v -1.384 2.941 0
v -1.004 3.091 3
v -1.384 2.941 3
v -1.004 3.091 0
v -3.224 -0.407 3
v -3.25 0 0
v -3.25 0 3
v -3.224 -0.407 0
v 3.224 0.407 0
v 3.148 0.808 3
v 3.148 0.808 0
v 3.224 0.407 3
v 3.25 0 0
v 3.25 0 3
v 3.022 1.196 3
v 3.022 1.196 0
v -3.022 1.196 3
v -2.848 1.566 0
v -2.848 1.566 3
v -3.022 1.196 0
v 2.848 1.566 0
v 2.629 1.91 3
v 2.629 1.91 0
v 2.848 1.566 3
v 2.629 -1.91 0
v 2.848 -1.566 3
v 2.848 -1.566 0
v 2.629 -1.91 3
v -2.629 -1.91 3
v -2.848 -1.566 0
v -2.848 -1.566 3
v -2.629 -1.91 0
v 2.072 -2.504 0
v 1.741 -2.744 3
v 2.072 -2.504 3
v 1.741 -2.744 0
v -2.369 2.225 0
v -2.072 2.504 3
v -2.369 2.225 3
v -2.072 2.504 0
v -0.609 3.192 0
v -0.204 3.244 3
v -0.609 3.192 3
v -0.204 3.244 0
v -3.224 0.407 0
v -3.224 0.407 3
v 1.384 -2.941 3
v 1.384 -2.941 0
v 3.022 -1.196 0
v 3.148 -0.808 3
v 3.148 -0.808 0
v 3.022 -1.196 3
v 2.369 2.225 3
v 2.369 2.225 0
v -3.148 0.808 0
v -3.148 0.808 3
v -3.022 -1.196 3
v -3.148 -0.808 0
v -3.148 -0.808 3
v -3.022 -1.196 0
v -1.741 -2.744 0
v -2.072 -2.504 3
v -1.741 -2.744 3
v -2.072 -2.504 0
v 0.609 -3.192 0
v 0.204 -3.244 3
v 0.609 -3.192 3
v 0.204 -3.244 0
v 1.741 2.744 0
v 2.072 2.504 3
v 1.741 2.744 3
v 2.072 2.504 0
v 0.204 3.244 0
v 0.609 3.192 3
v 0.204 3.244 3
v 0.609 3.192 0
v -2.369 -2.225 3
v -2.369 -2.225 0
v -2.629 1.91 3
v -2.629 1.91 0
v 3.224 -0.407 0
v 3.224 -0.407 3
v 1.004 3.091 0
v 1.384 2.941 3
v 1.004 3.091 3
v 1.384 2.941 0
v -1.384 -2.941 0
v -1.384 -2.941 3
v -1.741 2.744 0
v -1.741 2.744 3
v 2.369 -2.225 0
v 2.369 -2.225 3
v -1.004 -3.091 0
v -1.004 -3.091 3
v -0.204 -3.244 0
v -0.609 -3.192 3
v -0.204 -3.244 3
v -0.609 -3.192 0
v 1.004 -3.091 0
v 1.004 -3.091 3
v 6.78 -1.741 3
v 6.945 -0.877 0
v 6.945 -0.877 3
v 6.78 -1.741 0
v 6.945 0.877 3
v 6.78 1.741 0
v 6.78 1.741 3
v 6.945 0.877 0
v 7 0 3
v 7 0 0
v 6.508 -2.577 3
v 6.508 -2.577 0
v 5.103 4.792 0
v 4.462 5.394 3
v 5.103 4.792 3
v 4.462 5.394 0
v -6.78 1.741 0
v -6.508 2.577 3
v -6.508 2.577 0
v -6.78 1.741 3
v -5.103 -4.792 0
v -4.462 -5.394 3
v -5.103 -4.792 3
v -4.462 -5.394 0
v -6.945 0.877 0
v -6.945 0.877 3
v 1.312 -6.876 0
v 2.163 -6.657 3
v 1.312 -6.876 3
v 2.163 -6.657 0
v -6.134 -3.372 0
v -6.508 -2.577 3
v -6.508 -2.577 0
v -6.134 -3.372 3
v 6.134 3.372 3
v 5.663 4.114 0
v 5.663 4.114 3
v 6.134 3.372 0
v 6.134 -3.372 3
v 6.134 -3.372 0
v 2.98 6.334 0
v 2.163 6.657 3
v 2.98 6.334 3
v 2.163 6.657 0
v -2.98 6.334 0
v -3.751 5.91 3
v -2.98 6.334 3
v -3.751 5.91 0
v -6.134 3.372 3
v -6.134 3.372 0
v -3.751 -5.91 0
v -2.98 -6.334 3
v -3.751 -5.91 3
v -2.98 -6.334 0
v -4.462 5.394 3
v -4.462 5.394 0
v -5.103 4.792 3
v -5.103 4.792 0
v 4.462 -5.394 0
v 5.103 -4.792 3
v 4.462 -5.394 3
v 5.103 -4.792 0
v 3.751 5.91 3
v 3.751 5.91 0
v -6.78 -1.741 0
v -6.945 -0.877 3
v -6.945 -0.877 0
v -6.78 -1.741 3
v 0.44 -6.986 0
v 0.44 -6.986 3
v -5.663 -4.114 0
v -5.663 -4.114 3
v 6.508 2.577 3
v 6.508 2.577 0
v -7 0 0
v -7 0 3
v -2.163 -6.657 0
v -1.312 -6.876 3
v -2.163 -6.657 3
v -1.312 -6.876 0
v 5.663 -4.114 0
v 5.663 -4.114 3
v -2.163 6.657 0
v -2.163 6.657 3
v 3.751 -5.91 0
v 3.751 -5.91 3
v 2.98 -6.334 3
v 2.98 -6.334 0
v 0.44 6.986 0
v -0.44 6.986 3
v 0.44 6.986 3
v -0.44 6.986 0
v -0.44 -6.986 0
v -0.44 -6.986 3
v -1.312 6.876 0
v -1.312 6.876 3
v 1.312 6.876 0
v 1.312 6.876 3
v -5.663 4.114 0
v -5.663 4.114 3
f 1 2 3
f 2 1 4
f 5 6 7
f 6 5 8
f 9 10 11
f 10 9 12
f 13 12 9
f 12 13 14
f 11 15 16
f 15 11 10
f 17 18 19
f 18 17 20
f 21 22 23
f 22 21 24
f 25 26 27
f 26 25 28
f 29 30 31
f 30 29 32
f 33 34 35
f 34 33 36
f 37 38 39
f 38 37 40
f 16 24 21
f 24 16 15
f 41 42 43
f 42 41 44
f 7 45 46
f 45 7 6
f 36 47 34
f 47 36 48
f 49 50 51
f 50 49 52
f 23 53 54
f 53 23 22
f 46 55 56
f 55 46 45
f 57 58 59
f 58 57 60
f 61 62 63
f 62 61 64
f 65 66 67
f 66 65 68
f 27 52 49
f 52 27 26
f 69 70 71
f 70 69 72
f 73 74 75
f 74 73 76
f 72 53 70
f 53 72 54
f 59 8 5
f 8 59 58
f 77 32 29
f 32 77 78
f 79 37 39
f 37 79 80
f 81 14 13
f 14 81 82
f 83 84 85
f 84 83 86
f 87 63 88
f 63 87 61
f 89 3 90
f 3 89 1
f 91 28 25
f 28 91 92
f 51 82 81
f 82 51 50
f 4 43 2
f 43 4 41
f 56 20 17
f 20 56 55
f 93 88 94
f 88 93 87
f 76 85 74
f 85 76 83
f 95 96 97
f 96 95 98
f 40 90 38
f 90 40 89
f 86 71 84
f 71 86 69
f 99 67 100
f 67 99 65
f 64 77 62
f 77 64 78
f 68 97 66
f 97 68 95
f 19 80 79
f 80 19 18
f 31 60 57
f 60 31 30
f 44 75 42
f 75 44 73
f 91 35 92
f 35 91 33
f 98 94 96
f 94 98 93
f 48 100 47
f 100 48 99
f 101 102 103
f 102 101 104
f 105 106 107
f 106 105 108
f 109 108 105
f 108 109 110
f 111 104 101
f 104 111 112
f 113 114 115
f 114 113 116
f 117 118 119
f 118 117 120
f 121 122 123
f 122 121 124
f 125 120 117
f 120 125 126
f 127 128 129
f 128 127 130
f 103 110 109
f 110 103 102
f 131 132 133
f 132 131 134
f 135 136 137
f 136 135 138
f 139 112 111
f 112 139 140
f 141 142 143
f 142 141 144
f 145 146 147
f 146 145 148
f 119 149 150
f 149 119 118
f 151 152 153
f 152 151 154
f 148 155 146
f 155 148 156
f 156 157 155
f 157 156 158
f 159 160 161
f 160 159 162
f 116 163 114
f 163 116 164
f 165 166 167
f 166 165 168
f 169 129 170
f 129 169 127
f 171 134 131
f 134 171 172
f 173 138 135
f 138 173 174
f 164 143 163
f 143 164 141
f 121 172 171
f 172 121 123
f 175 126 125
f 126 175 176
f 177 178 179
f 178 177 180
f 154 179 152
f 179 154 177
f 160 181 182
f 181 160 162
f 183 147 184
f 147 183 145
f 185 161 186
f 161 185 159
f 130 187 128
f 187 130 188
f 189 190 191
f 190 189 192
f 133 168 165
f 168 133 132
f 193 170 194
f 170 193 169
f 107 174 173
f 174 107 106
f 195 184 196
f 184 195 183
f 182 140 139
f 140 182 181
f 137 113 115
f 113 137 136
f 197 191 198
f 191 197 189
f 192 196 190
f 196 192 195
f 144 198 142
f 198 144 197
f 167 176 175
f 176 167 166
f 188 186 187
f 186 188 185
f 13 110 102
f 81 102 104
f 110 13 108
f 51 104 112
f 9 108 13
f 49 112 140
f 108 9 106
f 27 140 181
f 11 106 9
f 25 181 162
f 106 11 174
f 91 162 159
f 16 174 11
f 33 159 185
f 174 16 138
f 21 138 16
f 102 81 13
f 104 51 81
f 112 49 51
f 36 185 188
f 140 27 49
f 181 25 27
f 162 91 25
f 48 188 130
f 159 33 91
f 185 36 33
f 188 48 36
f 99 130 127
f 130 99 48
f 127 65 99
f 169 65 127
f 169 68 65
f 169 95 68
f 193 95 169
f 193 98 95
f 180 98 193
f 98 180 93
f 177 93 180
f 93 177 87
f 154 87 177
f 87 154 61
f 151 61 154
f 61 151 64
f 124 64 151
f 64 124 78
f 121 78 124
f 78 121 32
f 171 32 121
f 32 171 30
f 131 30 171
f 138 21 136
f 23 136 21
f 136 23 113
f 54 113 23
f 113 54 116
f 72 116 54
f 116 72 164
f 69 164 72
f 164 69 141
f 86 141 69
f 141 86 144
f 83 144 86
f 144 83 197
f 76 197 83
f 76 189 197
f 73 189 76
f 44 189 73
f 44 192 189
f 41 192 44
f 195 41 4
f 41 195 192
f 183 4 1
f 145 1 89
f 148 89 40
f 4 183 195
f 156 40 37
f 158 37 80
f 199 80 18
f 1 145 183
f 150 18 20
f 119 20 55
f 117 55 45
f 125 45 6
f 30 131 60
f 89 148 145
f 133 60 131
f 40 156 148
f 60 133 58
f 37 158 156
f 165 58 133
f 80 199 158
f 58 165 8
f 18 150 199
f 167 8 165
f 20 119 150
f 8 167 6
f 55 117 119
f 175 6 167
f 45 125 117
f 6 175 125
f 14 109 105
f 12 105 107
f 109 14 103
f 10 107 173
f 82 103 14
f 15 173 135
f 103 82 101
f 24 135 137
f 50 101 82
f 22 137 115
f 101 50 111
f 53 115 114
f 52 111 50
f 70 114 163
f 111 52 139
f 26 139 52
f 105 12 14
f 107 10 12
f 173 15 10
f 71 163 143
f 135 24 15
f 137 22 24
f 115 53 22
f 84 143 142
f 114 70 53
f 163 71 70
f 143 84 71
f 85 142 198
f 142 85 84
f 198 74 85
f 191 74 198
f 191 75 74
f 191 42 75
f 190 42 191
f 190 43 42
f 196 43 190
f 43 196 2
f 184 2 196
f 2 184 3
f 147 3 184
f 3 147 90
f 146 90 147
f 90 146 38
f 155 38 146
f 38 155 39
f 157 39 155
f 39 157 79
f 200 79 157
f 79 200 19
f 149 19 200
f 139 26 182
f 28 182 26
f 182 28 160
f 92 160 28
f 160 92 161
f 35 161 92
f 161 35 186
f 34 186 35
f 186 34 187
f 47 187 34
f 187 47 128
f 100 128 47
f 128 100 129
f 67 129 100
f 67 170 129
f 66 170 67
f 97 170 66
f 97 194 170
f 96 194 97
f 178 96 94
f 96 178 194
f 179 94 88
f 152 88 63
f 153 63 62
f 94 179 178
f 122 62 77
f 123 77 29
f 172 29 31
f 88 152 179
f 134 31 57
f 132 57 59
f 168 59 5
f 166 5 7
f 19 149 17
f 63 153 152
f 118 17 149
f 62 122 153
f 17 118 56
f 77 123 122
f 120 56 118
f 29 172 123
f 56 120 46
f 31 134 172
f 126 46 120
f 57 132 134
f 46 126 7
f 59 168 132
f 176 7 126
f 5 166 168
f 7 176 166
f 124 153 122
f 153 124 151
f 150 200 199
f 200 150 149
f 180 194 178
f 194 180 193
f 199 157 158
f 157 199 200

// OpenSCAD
$fn = 50;


difference() {
	union() {
		cylinder(h = 3, r = 7.0000000000);
	}
	union() {
		#translate(v = [0.0000000000, 0.0000000000, -100.0000000000]) {
			cylinder(h = 200, r = 3.2500000000);
		}
		#translate(v = [0.0000000000, 0.0000000000, -100.0000000000]) {
			cylinder(h = 200, r = 3.2500000000);
		}
		#translate(v = [0.0000000000, 0.0000000000, -100.0000000000]) {
			cylinder(h = 200, r = 3.2500000000);
		}
		#translate(v = [0.0000000000, 0.0000000000, -100.0000000000]) {
			cylinder(h = 200, r = 3.2500000000);
		}
		#cylinder(h = 3, r = 2.0000000000);
	}
}
